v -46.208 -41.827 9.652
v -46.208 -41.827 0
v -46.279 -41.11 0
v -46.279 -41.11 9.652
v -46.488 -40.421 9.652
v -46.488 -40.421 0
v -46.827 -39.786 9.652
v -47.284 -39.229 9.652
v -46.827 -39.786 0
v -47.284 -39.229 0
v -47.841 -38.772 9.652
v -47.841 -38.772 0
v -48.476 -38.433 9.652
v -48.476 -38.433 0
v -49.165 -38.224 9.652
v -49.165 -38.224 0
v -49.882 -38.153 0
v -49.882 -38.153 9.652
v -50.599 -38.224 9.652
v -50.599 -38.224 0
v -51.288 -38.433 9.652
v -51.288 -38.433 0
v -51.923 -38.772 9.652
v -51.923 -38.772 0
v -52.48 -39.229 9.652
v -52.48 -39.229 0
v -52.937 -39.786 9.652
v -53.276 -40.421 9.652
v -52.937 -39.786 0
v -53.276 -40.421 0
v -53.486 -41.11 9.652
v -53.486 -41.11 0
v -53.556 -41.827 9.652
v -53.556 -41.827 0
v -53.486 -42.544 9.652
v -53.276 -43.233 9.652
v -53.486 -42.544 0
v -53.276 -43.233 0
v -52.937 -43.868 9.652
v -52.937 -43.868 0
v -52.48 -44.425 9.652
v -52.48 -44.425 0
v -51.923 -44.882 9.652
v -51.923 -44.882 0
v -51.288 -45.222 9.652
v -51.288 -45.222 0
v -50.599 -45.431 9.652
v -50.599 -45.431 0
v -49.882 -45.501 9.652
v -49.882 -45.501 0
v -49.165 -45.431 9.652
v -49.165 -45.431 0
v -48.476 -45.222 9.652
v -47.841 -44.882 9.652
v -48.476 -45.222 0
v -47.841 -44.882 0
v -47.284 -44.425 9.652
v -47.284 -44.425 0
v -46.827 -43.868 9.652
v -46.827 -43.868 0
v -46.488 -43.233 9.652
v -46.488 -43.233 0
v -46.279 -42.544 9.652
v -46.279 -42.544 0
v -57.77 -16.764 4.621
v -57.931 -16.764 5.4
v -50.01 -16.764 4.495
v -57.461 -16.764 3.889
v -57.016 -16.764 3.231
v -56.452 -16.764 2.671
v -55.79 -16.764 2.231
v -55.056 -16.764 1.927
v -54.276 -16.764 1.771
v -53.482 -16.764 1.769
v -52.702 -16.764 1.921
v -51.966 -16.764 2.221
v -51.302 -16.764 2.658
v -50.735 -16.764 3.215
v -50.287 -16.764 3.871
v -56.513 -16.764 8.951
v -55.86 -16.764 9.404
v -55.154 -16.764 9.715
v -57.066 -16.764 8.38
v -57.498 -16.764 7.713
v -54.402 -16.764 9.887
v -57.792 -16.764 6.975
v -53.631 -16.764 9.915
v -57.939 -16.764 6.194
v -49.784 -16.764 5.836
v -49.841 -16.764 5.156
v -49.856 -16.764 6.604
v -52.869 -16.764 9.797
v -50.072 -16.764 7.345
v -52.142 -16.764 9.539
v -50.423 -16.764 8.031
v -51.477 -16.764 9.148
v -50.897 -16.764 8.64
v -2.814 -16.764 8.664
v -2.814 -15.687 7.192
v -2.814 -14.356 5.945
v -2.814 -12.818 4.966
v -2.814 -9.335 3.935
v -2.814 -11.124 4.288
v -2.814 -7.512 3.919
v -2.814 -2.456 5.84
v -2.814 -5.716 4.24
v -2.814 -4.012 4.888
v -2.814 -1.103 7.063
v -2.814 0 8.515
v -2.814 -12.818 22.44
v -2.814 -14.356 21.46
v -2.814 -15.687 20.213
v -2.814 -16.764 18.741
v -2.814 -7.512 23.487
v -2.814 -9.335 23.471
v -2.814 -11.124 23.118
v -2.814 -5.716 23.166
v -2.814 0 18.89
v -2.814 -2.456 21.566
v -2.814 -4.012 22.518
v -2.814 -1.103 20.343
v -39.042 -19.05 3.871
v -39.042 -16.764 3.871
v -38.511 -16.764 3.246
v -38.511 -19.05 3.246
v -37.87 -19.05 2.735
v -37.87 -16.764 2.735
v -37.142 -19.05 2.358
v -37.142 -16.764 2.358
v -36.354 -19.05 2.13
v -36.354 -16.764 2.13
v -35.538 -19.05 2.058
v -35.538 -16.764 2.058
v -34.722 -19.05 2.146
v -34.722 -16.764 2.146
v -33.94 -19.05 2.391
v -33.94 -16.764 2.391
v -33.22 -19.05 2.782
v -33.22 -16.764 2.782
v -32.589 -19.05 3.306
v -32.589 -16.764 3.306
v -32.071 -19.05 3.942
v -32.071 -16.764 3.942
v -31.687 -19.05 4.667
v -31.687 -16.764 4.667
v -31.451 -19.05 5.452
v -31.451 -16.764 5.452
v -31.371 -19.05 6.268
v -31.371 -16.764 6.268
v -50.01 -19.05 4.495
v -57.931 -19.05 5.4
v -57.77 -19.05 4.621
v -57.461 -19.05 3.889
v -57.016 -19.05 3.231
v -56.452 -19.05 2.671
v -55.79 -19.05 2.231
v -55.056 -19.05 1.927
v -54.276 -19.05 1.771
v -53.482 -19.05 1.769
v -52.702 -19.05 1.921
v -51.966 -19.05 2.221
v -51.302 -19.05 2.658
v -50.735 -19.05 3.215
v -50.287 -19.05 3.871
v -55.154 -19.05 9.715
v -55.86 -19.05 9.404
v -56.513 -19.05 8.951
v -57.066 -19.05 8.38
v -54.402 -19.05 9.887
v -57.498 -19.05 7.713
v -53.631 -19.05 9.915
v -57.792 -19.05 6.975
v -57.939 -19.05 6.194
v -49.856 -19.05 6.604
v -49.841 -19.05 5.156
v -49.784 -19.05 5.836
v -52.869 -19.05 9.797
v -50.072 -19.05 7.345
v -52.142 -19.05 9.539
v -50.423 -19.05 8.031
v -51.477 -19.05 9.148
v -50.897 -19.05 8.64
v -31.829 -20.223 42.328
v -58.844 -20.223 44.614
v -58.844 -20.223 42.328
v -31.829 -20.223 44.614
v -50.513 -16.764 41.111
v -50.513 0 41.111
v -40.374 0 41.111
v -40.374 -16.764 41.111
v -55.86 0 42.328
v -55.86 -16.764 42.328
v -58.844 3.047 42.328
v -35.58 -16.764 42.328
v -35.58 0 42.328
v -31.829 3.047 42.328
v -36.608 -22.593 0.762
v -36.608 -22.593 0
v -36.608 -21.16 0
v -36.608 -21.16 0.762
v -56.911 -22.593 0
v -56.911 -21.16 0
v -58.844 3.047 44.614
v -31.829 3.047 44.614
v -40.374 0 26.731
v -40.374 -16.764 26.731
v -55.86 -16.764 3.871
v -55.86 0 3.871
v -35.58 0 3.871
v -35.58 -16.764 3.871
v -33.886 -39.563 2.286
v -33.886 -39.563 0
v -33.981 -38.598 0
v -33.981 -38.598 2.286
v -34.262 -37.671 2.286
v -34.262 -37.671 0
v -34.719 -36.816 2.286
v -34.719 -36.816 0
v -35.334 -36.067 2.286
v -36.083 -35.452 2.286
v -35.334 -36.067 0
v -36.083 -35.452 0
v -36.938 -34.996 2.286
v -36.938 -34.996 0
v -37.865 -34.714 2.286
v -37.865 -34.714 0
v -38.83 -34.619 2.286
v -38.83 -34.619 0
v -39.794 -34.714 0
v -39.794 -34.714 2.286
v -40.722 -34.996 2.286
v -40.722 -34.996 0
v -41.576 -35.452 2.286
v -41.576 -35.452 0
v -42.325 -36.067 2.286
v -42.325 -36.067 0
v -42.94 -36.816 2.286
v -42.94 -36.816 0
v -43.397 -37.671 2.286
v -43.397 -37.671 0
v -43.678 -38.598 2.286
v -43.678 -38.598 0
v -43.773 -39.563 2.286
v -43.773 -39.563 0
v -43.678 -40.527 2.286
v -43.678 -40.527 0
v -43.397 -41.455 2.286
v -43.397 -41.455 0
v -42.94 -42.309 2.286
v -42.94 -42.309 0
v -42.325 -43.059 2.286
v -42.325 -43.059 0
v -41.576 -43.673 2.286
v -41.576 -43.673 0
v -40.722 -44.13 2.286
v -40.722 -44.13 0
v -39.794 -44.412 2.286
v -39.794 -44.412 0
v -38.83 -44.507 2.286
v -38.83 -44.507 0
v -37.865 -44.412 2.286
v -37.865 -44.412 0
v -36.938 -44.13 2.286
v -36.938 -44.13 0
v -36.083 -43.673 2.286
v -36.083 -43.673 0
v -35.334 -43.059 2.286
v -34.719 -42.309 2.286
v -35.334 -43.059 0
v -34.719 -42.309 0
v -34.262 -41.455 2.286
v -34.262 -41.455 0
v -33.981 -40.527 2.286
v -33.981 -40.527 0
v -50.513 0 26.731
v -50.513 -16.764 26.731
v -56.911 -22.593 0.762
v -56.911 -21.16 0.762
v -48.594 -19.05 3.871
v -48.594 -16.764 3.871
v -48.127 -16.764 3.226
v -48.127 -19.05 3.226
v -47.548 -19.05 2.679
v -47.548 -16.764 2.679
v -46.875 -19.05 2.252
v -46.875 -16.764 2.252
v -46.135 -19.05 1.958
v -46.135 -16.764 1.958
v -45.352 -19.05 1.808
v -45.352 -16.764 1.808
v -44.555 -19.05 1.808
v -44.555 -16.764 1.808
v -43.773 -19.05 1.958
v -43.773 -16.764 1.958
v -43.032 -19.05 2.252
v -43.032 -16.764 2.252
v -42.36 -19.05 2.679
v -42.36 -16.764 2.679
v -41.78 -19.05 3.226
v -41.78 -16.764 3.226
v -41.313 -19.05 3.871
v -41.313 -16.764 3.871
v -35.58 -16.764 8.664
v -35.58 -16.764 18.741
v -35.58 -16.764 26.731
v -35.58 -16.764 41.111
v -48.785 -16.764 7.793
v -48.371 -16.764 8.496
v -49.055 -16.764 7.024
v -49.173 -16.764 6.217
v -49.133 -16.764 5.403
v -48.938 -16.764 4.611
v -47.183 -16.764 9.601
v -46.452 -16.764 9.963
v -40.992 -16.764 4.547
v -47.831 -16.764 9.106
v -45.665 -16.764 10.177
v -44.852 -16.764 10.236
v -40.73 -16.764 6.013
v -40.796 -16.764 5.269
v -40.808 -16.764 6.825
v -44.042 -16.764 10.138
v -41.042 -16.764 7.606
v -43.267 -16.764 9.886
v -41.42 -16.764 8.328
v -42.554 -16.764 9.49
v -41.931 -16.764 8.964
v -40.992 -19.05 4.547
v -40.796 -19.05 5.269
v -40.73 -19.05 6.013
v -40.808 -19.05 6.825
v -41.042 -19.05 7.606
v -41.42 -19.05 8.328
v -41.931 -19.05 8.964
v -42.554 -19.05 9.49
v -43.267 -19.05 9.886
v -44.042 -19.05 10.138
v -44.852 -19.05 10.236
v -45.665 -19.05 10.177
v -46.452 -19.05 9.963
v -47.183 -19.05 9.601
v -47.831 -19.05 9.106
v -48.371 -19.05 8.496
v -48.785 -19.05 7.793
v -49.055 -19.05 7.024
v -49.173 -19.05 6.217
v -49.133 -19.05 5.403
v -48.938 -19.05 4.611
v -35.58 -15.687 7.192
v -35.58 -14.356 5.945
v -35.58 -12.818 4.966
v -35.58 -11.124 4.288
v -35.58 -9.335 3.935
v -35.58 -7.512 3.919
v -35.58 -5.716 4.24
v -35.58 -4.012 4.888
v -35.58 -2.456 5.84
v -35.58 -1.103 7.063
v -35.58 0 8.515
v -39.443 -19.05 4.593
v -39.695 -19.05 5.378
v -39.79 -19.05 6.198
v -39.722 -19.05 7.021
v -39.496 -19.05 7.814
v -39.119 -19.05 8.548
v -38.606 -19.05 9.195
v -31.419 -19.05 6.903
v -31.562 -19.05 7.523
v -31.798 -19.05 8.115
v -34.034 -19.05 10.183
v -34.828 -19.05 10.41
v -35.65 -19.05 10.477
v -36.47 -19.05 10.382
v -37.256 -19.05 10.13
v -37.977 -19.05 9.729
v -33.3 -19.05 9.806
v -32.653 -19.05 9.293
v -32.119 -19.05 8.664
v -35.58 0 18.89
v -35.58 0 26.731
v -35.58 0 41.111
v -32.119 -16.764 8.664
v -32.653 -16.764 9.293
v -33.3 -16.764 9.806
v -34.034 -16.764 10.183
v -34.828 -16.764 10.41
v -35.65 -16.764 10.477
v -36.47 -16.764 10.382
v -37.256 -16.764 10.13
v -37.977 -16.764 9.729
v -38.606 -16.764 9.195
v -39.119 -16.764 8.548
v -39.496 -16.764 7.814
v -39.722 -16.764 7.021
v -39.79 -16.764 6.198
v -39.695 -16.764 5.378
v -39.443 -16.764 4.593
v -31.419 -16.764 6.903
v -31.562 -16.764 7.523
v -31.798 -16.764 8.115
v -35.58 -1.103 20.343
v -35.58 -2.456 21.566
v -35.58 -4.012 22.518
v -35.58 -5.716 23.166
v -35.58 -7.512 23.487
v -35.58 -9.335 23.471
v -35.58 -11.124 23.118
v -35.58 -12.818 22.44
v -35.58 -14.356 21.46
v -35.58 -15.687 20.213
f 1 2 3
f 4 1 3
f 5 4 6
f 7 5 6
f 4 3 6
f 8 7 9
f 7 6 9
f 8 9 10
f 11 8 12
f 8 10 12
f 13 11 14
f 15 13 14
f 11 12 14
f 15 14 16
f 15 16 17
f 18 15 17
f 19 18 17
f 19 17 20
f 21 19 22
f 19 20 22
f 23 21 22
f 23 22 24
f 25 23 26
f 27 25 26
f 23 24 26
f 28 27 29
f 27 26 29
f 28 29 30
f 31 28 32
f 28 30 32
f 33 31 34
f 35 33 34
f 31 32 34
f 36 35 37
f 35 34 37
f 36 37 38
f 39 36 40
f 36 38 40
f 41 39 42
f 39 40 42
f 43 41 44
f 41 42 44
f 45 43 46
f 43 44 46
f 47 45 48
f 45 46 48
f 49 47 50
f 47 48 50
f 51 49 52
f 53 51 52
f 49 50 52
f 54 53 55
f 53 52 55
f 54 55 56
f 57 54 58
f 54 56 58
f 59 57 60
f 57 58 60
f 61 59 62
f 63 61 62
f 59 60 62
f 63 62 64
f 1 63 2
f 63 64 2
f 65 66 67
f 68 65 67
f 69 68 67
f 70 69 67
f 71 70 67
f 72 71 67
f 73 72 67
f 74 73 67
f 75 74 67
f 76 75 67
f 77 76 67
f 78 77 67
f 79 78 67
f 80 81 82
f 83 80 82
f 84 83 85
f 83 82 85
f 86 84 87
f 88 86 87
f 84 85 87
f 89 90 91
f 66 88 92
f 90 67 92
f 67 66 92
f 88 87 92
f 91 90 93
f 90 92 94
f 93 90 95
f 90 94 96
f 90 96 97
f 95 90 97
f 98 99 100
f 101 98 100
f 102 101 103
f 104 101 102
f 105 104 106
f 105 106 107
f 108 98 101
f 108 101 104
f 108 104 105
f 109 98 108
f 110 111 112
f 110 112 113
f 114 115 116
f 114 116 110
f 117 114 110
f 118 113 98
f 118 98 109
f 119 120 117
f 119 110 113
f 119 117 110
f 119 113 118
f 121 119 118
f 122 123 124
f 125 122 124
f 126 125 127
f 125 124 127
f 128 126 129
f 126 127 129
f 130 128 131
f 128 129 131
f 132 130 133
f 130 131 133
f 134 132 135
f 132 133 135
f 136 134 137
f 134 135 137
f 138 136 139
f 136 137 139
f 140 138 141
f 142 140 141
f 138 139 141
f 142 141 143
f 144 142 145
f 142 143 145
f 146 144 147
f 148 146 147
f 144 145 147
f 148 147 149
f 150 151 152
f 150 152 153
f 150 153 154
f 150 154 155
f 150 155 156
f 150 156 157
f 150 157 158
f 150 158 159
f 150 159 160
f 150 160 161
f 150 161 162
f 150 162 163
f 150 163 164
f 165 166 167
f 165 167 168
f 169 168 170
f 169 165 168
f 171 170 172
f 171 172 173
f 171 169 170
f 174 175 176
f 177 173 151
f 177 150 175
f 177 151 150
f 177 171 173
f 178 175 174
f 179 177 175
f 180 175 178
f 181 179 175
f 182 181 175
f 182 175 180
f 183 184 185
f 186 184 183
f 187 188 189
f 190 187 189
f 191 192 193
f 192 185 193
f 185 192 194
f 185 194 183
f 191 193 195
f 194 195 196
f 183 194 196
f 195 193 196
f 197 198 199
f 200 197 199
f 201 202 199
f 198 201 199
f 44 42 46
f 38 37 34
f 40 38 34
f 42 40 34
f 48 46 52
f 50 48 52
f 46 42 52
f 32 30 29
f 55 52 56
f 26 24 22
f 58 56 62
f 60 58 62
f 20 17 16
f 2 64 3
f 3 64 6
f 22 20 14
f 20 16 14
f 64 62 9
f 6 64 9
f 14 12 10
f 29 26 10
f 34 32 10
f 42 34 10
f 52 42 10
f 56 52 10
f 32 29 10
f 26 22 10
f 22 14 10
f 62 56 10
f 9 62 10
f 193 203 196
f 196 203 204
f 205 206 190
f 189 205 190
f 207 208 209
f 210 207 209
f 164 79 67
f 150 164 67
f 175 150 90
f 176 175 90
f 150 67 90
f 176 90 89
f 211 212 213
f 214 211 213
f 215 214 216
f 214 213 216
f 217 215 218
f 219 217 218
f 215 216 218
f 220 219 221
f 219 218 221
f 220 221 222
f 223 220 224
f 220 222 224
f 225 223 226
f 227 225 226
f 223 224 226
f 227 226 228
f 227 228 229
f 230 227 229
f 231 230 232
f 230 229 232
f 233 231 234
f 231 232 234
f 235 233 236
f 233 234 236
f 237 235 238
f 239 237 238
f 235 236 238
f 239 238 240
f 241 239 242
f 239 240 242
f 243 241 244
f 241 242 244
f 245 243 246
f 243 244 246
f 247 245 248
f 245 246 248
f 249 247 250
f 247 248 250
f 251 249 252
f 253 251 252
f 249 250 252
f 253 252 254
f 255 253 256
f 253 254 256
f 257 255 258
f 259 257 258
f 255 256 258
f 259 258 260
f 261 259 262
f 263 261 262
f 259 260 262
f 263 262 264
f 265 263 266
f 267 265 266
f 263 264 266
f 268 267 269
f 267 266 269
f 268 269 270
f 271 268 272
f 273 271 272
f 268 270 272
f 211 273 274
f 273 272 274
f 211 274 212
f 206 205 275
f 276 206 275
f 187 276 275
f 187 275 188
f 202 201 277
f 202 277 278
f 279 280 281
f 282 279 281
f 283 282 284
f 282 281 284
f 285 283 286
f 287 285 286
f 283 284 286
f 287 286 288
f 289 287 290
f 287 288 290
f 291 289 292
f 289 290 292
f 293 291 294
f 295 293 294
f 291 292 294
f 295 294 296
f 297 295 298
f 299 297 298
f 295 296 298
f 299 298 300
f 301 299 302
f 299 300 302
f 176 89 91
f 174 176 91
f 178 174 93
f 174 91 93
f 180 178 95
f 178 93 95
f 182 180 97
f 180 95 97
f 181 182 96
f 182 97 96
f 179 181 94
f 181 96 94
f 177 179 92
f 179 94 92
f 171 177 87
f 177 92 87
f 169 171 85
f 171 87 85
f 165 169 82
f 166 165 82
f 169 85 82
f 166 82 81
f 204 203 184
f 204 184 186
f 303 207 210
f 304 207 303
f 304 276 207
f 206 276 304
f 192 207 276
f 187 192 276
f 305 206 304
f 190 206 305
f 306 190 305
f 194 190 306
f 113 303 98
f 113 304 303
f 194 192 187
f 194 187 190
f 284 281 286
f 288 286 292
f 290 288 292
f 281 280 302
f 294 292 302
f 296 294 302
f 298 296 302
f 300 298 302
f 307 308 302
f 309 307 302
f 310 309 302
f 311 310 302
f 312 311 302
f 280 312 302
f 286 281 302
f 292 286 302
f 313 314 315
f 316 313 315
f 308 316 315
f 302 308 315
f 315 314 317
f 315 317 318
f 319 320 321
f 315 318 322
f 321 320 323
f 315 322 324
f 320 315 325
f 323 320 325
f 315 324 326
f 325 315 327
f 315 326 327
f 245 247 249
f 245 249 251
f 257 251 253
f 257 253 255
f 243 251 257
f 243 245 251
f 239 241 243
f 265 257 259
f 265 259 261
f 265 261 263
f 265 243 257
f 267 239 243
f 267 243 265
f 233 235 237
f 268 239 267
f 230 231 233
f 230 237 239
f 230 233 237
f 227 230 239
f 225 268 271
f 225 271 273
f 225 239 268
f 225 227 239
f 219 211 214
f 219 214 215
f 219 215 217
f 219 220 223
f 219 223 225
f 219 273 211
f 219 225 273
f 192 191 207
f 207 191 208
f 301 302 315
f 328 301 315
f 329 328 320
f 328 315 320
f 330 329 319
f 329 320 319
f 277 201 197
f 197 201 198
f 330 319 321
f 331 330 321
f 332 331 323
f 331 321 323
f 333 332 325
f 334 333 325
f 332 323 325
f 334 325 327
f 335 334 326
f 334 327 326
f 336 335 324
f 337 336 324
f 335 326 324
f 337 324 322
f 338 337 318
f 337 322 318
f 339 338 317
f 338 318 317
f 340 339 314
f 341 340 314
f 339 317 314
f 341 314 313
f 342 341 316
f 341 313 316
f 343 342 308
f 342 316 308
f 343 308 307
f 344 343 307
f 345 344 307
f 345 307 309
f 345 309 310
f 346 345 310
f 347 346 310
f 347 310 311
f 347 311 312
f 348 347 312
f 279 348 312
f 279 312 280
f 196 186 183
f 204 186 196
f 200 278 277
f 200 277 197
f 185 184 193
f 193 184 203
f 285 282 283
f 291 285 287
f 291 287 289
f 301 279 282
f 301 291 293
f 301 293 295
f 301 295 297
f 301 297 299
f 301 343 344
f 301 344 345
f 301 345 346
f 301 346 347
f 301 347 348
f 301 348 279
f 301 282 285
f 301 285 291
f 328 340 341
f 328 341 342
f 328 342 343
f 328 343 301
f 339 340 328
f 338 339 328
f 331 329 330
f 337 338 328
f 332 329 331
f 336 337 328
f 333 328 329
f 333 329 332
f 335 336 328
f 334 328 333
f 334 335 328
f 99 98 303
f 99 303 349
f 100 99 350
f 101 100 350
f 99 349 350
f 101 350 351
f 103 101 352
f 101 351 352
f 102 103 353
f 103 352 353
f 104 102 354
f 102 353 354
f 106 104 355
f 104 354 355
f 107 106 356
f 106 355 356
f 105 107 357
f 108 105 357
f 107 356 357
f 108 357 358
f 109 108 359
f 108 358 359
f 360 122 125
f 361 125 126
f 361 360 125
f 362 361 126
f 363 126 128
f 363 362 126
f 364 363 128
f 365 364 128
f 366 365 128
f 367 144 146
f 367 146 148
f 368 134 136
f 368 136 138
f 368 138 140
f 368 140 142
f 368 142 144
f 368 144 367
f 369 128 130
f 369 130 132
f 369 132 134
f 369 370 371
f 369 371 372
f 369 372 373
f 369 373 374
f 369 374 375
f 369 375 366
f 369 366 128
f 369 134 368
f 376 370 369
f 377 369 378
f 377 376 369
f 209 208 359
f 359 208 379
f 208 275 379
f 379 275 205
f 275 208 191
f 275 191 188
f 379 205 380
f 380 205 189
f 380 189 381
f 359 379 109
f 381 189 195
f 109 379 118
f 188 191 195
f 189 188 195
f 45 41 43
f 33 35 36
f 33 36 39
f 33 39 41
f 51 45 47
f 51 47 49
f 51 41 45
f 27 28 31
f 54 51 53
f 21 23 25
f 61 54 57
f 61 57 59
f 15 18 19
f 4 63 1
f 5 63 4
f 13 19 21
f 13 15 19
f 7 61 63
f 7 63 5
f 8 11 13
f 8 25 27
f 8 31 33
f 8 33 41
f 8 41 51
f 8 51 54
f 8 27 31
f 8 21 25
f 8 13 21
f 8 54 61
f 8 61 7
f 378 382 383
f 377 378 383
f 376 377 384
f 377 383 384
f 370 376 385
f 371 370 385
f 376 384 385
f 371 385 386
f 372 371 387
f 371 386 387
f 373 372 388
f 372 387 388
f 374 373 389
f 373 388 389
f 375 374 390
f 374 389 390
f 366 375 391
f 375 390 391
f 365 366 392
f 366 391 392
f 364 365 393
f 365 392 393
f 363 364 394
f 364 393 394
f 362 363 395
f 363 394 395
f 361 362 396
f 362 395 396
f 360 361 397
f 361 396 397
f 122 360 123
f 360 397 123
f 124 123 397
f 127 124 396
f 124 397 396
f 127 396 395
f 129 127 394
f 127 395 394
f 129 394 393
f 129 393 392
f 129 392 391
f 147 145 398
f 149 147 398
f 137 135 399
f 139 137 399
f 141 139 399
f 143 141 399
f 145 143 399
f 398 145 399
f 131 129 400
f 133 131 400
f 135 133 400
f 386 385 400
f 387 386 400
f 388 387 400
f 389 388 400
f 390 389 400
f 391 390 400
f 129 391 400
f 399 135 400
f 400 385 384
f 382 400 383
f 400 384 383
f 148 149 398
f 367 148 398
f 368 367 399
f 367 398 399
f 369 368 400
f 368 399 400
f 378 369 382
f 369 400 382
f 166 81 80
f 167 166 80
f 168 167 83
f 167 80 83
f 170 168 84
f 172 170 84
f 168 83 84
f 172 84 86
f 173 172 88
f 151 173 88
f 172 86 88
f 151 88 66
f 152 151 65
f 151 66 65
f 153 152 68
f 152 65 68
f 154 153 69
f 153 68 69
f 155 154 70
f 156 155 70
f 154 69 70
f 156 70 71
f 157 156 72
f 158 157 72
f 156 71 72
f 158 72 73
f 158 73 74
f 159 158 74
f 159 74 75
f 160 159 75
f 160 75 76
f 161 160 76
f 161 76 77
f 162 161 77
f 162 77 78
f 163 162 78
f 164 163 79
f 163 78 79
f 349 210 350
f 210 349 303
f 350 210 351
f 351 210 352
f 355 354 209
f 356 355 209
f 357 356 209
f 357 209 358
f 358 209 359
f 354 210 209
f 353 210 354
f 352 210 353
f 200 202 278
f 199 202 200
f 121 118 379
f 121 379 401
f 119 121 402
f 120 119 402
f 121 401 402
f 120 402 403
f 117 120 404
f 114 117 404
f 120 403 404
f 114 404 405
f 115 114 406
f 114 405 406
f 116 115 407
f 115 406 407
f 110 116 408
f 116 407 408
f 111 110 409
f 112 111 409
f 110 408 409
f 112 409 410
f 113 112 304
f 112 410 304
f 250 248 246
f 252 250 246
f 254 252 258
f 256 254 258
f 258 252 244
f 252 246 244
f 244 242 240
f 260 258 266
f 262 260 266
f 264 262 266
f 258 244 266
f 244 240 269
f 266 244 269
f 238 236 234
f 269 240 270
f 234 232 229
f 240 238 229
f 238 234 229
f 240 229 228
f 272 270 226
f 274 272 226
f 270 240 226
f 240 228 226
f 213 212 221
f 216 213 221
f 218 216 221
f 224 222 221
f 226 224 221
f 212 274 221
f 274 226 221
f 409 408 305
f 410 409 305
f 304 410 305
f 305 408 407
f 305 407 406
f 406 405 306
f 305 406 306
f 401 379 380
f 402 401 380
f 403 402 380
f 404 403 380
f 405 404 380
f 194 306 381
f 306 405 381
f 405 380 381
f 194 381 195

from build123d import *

# Parameters (mm, degrees)
F0_W      = 5.3462907672
F0_H      = 14.3796782941
F0_W_2    = 4.7932267189
F1_DEPTH  = 16.764
F3_DEPTH  = 32.766
F5_DEPTH  = 2.286
F6_W      = 27.0146168768
F6_H      = 23.2701618224
F6_W_2    = 20.2790349722
F6_H_2    = 16.764
F7_DEPTH  = 2.286
F8_R      = 3.6739968983
F9_DEPTH  = 9.652
F10_R     = 4.9436336388
F11_DEPTH = 2.286
F12_W     = 20.3028172255
F12_H     = 1.4335289598
F13_DEPTH = 0.762


with BuildPart() as f1:
    # F0 (on Front) → F1 (new body)
    with BuildSketch(Plane.XZ):
        Polygon((-50.5132265389, 26.7314519733), (-55.8595173061, 26.7314519733), (-55.8595173061, 3.8714515977), (-35.5804823339, 3.8714515977), (-35.5804823339, 26.7314519733), (-40.3737090528, 26.7314519733), align=None)
        with Locations((-53.1863719225, 33.9212911204)):
            Rectangle(F0_W, F0_H)
        with Locations((-37.9770956933, 33.9212911204)):
            Rectangle(F0_W_2, F0_H)
        Polygon((-35.5804823339, 44.6138679981), (-55.8595173061, 44.6138679981), (-55.8595173061, 41.1111302674), (-50.5132265389, 41.1111302674), (-40.3737090528, 41.1111302674), (-35.5804823339, 41.1111302674), align=None)
    extrude(amount=F1_DEPTH)

    # F2 (on face) → F3 (join)
    with BuildSketch(Plane.YZ.offset(-35.5804823339)):
        with BuildLine():
            Line((0, 8.5152019426), (0, 18.8903617993))
            ThreePointArc((0, 18.8903617993), (-8.4237840592, 23.5212434846), (-16.764, 18.74149442))
            Line((-16.764, 18.74149442), (-16.764, 8.6640693219))
            ThreePointArc((-16.764, 8.6640693219), (-8.4237840592, 3.8843202573), (0, 8.5152019426))
        make_face()
    extrude(amount=F3_DEPTH)

    # F6 (on face) → F7 (join)
    with BuildSketch(Plane.XY.offset(44.6138679981)):
        with Locations((-45.3363340348, -8.58834479)):
            Rectangle(F6_W, F6_H)
        with Locations((-45.71999982, -8.382)):
            Rectangle(F6_W_2, F6_H_2, mode=Mode.SUBTRACT)
    extrude(amount=-F7_DEPTH)


with BuildPart() as f5:
    # F4 (on face) → F5 (new body)
    with BuildSketch(Plane.XZ.offset(16.764)):
        with BuildLine():
            Line((-55.8595173061, 3.8714515977), (-55.8595173061, 9.4039771229))
            ThreePointArc((-55.8595173061, 9.4039771229), (-56.7473613934, 2.9371276158), (-50.287063539, 3.8714515977))
            Line((-50.287063539, 3.8714515977), (-55.8595173061, 3.8714515977))
        make_face()
        with BuildLine():
            ThreePointArc((-50.287063539, 3.8714515977), (-49.9114191575, 4.8221378969), (-49.7835356487, 5.83631685))
            ThreePointArc((-49.7835356487, 5.83631685), (-51.8003381954, 9.3593039676), (-55.8595173061, 9.4039771229))
            Line((-55.8595173061, 9.4039771229), (-55.8595173061, 3.8714515977))
            Line((-55.8595173061, 3.8714515977), (-50.287063539, 3.8714515977))
        make_face()
    extrude(amount=F5_DEPTH)


with BuildPart() as f5b:
    # F4 (on face) → F5, piece 2 (new body)
    with BuildSketch(Plane.XZ.offset(16.764)):
        with BuildLine():
            Line((-41.3130086328, 3.8714515977), (-48.5944363807, 3.8714515977))
            ThreePointArc((-48.5944363807, 3.8714515977), (-44.9537225068, 1.7893560978), (-41.3130086328, 3.8714515977))
        make_face()
        with BuildLine():
            ThreePointArc((-40.7296321171, 6.0134464875), (-46.0637304197, 10.0890841128), (-48.5944363807, 3.8714515977))
            Line((-48.5944363807, 3.8714515977), (-41.3130086328, 3.8714515977))
            ThreePointArc((-41.3130086328, 3.8714515977), (-40.8780848814, 4.9034385746), (-40.7296321171, 6.0134464875))
        make_face()
    extrude(amount=F5_DEPTH)


with BuildPart() as f5c:
    # F4 (on face) → F5, piece 3 (new body)
    with BuildSketch(Plane.XZ.offset(16.764)):
        with BuildLine():
            Line((-35.5804823339, 3.8714515977), (-39.0415708426, 3.8714515977))
            ThreePointArc((-39.0415708426, 3.8714515977), (-34.3252244248, 2.2495820903), (-31.3707994684, 6.2677604598))
            ThreePointArc((-31.3707994684, 6.2677604598), (-31.5623039644, 7.5230183689), (-32.1193938252, 8.6640693219))
            Line((-32.1193938252, 8.6640693219), (-35.5804823339, 8.6640693219))
            Line((-35.5804823339, 8.6640693219), (-35.5804823339, 3.8714515977))
        make_face()
        with BuildLine():
            ThreePointArc((-32.1193938252, 8.6640693219), (-37.976791196, 9.7288489685), (-39.0415708426, 3.8714515977))
            Line((-39.0415708426, 3.8714515977), (-35.5804823339, 3.8714515977))
            Line((-35.5804823339, 3.8714515977), (-35.5804823339, 8.6640693219))
            Line((-35.5804823339, 8.6640693219), (-32.1193938252, 8.6640693219))
        make_face()
    extrude(amount=F5_DEPTH)


with BuildPart() as f9:
    # F8 (on Top) → F9 (new body)
    with BuildSketch(Plane.XY):
        with Locations((-49.8821027577, -41.8271832168)):
            Circle(F8_R)
    extrude(amount=F9_DEPTH)


with BuildPart() as f11:
    # F10 (on Top) → F11 (new body)
    with BuildSketch(Plane.XY):
        with Locations((-38.8298146427, -39.5628958941)):
            Circle(F10_R)
    extrude(amount=F11_DEPTH)


with BuildPart() as f13:
    # F12 (on Top) → F13 (new body)
    with BuildSketch(Plane.XY):
        with Locations((-46.7597767711, -21.8764077872)):
            Rectangle(F12_W, F12_H)
    extrude(amount=F13_DEPTH)


solid = Compound([f1.part, f5.part, f5b.part, f5c.part, f9.part, f11.part, f13.part])
